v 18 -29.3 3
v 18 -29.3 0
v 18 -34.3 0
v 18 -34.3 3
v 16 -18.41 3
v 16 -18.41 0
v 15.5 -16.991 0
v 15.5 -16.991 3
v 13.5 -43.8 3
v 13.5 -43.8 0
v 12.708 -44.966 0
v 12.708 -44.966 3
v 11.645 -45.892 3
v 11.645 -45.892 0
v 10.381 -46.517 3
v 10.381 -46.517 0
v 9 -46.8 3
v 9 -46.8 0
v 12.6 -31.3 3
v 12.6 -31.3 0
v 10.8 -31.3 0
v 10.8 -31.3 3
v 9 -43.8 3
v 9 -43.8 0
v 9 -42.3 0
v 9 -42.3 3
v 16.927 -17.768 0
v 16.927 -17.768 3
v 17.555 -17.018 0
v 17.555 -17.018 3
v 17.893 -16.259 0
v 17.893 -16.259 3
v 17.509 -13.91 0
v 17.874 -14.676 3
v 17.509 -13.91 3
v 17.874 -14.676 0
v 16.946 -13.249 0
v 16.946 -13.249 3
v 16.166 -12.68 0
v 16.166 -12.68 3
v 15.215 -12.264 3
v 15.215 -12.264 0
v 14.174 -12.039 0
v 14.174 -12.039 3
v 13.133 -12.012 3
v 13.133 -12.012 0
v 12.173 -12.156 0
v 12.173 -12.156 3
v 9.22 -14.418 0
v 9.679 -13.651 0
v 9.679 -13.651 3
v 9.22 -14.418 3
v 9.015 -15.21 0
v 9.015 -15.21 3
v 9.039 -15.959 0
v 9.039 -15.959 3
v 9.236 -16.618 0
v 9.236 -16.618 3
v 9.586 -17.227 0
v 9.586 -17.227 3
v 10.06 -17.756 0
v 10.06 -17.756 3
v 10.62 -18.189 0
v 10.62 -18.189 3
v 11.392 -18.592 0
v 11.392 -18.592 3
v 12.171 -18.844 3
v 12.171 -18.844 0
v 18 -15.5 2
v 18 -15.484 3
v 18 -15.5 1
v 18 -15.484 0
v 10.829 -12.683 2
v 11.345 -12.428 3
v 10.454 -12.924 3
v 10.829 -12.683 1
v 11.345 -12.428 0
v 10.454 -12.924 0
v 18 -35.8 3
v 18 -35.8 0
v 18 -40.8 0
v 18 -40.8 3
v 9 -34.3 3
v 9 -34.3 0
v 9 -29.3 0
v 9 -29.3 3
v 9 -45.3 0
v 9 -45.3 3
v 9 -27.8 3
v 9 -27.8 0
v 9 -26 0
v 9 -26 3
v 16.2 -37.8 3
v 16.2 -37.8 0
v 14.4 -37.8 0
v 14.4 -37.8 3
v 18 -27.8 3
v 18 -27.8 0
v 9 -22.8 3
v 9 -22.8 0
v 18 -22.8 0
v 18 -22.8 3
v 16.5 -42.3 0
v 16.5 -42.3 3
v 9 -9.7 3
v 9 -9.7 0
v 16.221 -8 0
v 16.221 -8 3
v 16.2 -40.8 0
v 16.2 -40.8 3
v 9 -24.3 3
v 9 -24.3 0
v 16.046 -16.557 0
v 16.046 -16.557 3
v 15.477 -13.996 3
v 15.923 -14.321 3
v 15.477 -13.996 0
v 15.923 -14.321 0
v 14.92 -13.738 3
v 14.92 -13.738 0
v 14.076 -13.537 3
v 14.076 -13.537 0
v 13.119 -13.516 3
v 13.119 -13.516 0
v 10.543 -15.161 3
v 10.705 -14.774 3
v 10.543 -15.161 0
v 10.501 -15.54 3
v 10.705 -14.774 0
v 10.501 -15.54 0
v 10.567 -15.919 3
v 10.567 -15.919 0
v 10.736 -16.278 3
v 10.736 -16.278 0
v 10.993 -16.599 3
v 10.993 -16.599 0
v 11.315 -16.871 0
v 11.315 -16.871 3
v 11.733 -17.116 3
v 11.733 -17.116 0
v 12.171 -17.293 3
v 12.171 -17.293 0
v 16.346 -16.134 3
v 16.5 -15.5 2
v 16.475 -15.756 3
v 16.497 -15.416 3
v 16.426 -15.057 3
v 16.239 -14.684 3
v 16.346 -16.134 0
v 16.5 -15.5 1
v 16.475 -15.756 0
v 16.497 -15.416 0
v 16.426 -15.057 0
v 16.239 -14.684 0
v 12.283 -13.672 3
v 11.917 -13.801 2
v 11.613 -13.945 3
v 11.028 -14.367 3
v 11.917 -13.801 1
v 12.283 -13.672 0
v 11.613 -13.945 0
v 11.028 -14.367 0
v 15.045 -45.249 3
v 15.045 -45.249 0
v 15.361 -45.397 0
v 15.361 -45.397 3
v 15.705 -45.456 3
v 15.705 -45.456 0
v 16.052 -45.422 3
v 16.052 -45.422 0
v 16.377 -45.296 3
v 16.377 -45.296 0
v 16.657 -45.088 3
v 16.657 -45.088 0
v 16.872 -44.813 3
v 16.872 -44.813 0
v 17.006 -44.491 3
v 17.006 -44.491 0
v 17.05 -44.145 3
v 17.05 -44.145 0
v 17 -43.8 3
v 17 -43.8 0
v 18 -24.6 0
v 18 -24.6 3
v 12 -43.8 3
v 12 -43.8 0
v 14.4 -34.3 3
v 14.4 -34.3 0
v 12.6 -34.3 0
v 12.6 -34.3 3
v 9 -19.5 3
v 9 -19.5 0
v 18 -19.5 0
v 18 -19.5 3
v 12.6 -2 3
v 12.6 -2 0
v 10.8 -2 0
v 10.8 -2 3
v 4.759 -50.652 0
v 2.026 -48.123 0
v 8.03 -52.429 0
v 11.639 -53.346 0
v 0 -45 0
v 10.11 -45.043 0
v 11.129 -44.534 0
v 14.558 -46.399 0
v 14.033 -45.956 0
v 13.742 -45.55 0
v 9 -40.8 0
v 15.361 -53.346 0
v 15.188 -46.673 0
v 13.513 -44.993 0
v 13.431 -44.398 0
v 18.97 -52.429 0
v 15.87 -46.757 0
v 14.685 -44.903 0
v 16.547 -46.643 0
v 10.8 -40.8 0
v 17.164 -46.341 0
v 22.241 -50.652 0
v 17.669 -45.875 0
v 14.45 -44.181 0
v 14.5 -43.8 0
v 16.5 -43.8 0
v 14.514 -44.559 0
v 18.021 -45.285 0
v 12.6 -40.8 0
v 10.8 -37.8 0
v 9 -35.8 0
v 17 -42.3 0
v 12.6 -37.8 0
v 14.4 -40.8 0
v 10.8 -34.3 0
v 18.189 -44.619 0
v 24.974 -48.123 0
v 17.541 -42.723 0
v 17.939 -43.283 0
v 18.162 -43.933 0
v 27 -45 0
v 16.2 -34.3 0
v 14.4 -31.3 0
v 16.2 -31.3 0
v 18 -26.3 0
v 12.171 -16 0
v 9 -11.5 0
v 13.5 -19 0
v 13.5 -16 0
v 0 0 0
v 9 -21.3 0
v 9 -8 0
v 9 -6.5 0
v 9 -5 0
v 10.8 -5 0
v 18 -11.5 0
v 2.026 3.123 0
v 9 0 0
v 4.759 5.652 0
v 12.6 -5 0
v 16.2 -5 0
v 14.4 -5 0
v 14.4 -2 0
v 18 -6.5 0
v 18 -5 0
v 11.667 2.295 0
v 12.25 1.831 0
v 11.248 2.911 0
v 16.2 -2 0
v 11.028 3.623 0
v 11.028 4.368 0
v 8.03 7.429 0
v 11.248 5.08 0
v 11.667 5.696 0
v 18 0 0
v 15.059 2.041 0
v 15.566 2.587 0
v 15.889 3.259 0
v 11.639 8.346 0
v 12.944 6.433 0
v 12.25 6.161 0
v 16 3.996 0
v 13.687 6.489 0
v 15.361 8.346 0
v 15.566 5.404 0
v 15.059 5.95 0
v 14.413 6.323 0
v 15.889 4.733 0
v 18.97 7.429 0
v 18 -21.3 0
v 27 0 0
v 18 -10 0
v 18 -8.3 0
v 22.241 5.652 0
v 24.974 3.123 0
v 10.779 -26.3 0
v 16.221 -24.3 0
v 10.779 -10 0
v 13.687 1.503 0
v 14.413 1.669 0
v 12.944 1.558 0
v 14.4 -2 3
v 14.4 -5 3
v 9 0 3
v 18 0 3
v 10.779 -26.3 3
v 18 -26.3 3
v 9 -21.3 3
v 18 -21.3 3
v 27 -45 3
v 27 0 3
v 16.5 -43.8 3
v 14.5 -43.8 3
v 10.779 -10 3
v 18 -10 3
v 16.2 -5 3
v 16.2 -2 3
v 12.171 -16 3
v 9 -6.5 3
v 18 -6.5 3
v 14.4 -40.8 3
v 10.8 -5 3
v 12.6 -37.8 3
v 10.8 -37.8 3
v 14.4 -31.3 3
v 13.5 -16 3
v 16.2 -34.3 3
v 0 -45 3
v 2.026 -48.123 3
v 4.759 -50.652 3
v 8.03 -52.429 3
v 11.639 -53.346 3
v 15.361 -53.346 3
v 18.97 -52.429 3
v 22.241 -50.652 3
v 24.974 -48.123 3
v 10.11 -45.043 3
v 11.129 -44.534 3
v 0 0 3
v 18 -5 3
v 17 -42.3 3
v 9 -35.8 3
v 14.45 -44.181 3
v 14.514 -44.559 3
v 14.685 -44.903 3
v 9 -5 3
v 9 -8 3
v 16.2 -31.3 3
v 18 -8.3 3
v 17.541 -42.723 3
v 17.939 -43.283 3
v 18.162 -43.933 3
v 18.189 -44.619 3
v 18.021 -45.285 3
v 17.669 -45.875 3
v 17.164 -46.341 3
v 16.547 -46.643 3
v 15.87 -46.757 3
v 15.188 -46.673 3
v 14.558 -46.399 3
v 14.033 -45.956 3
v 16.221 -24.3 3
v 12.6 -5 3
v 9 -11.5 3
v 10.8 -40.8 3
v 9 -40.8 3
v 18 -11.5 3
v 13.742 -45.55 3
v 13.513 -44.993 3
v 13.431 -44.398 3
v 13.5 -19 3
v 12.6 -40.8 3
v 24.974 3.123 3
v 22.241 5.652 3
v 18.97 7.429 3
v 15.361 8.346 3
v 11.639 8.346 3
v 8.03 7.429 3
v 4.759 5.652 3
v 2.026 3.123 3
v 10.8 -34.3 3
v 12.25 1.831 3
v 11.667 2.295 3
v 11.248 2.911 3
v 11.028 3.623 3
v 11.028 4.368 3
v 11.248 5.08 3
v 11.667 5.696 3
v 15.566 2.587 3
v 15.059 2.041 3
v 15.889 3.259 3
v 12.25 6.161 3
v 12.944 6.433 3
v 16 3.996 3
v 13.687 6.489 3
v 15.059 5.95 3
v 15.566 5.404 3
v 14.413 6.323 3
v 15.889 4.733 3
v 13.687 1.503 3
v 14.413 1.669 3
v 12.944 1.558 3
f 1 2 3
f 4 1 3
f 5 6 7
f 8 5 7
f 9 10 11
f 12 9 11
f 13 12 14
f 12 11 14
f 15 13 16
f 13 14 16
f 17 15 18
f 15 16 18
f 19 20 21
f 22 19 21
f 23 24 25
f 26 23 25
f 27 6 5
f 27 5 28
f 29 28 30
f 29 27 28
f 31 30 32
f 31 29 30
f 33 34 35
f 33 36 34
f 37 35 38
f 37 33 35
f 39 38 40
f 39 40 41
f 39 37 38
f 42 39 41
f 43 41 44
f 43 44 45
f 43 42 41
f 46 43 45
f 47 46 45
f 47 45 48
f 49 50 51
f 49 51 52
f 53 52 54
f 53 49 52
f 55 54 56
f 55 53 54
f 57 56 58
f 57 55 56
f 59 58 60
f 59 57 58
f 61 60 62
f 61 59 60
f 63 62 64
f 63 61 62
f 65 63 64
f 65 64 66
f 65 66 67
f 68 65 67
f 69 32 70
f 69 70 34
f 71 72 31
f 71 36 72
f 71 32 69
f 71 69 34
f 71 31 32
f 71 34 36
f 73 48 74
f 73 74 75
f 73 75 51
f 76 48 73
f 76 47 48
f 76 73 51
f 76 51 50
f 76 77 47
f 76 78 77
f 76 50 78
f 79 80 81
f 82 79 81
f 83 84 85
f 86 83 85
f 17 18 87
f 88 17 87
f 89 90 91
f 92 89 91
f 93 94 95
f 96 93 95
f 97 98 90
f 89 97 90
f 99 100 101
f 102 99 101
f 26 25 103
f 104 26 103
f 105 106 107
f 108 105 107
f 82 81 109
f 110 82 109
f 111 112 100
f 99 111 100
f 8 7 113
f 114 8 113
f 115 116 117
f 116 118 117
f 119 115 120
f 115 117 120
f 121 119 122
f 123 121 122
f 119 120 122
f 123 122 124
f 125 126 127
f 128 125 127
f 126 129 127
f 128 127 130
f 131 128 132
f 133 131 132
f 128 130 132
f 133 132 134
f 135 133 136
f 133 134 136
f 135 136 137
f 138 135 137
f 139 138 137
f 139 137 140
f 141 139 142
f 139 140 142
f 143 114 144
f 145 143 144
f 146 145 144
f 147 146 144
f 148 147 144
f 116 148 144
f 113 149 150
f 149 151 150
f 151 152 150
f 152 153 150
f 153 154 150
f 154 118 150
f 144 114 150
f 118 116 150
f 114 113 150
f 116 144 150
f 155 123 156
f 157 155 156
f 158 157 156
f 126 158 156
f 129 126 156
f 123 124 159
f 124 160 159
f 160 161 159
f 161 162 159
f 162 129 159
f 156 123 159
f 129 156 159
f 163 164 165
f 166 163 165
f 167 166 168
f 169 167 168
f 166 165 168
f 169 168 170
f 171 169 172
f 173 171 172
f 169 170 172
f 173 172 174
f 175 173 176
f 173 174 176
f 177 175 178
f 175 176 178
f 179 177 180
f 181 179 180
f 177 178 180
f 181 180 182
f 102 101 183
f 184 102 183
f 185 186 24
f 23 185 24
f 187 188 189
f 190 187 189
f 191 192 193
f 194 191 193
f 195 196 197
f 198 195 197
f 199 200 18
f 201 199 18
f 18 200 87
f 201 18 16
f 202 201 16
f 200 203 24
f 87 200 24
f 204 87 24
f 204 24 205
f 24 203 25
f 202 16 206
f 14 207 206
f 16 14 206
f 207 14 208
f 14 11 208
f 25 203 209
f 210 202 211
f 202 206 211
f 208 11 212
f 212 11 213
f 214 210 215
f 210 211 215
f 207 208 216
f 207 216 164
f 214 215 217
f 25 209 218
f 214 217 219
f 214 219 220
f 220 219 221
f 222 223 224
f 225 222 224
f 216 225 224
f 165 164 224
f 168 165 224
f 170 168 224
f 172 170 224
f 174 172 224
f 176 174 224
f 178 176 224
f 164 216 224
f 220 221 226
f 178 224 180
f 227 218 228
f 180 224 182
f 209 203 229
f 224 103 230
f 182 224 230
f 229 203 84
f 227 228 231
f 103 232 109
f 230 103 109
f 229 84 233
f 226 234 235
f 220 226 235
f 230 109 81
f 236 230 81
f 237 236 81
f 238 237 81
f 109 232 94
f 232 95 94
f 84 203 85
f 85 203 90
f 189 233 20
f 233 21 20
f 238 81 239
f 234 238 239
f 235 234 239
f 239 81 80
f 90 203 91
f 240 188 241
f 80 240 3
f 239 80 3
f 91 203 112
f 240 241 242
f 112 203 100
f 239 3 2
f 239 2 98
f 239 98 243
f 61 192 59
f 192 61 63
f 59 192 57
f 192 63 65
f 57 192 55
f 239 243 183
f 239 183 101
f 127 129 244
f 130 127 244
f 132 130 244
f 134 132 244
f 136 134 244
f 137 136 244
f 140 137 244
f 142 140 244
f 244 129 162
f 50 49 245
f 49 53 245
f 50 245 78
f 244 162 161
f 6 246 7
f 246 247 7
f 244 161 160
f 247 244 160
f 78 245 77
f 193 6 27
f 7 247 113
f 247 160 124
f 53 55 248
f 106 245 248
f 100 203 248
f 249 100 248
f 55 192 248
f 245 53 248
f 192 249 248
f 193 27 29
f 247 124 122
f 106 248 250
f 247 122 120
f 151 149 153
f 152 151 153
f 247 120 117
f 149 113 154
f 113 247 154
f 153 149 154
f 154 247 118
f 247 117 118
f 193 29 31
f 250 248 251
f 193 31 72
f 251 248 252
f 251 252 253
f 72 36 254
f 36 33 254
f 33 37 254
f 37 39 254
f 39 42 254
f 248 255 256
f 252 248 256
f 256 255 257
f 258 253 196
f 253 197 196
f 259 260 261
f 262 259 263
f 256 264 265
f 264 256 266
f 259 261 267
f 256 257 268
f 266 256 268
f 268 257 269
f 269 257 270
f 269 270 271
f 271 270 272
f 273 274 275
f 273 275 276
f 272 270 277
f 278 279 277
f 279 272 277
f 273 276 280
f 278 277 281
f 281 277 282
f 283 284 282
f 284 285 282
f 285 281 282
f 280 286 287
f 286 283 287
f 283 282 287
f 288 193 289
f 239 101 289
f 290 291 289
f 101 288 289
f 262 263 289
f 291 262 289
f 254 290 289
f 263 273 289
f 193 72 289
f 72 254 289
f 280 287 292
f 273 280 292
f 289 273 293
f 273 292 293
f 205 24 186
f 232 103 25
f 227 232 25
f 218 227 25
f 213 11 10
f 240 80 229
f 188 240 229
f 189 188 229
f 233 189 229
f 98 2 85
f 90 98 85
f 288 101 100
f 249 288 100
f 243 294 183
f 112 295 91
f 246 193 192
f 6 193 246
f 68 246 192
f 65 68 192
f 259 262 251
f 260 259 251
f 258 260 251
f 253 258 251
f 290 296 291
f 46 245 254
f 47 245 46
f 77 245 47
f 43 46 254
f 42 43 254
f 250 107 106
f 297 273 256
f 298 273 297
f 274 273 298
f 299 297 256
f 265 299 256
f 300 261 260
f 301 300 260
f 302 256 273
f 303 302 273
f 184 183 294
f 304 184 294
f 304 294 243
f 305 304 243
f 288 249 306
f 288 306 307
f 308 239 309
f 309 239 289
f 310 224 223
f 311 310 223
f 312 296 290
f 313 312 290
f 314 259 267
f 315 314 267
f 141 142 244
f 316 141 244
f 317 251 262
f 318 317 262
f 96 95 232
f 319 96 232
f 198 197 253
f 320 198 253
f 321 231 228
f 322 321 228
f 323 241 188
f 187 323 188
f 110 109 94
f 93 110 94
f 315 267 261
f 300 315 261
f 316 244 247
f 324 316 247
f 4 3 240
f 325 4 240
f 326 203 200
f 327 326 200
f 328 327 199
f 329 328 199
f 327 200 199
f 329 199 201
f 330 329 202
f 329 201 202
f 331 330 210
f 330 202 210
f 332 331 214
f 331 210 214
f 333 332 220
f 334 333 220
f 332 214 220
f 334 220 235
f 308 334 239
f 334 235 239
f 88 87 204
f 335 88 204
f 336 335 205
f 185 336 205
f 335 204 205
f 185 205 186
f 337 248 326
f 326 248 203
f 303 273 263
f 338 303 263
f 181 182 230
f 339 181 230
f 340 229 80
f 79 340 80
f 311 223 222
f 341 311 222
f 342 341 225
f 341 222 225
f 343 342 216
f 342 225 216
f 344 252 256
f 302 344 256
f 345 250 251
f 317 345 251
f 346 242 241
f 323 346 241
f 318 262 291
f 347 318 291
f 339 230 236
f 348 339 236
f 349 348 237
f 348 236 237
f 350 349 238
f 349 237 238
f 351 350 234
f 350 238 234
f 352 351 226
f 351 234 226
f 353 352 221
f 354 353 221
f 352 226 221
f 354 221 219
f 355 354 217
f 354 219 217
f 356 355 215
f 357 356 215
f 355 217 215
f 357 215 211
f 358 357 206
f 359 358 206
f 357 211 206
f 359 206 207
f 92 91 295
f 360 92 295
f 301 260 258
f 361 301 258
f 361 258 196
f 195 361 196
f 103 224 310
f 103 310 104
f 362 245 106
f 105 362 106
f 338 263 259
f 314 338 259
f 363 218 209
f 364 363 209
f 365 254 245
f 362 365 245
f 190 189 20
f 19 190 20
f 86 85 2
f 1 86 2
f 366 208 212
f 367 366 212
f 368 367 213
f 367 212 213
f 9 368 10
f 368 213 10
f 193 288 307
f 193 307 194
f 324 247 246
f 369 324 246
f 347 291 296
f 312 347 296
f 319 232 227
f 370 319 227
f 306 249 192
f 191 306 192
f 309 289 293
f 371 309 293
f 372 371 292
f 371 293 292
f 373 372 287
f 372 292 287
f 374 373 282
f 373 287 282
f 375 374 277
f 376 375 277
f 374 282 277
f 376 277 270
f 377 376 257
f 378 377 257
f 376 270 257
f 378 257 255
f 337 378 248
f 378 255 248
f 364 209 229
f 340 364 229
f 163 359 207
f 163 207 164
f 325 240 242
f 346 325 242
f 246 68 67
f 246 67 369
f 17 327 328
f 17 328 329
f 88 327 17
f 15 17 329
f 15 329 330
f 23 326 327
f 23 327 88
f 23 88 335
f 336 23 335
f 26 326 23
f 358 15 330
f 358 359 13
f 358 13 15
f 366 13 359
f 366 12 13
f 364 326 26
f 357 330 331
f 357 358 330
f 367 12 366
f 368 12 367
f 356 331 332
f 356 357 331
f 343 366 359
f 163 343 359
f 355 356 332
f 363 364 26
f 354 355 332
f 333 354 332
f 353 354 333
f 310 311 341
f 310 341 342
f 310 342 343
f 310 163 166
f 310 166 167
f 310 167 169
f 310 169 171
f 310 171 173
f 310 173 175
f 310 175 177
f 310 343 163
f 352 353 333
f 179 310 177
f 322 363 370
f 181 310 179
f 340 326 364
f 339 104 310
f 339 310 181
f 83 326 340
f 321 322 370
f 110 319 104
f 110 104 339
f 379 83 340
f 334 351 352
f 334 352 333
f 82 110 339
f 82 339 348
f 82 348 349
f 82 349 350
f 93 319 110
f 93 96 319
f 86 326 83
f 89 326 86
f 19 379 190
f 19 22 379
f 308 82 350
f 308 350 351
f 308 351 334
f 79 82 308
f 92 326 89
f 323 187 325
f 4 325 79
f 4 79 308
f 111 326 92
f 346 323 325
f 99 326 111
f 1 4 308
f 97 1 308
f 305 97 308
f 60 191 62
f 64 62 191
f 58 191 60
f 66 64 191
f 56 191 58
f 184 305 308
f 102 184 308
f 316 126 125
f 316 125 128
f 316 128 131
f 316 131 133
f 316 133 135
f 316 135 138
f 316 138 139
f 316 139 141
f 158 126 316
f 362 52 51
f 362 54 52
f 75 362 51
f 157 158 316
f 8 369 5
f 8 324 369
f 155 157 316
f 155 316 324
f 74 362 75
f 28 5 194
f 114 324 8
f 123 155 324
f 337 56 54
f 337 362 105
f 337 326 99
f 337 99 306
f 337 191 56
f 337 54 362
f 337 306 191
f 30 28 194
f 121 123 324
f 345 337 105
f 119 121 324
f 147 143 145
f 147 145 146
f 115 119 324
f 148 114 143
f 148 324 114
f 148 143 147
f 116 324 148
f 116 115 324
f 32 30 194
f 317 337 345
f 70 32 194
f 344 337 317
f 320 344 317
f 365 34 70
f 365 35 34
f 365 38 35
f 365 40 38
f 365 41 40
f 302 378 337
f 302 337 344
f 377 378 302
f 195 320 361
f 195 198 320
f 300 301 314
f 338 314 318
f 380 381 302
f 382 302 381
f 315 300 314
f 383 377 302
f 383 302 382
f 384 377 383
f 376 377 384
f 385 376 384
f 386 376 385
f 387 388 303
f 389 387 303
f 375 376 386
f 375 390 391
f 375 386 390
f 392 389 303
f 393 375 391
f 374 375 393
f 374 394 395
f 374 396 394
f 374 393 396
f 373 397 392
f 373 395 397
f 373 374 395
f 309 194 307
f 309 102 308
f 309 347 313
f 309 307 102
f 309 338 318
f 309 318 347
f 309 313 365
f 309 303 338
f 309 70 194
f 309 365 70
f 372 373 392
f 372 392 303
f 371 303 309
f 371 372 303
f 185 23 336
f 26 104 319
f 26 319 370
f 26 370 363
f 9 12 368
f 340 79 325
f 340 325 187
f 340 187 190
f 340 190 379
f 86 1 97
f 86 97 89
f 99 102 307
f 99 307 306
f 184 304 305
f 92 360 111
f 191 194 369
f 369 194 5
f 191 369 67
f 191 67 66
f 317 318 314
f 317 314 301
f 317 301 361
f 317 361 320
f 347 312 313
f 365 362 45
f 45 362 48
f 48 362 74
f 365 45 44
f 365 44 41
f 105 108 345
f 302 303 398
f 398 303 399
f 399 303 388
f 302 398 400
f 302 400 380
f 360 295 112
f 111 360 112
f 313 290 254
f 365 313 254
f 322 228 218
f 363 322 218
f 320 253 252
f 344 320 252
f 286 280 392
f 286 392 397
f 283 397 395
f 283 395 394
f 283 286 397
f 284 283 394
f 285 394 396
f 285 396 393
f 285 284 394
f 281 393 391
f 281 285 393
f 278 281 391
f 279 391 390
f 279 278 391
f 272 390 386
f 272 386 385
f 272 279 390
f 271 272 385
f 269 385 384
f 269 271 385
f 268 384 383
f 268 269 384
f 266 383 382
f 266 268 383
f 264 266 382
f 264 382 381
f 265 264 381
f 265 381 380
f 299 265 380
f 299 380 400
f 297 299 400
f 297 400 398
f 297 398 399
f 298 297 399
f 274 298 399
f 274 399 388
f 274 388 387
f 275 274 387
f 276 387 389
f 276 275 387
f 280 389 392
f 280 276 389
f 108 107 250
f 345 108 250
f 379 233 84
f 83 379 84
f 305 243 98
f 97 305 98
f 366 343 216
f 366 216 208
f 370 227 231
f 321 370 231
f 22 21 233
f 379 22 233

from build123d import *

# Parameters (mm, degrees)
F0_W     = 9
F0_H     = 1.8
F0_R     = 2.5
F0_W_2   = 0.5
F0_H_2   = 1.5
F1_DEPTH = 3


with BuildPart() as f1:
    # F0 (on Top) → F1 (new body)
    with BuildSketch(Plane.XY):
        with BuildLine():
            ThreePointArc((27, 0), (13.5, 8.4616515847), (0, 0))
            Line((0, 0), (0, -45))
            ThreePointArc((0, -45), (13.5, -53.4616515847), (27, -45))
            Line((27, -45), (27, 0))
        make_face()
        with BuildLine():
            Line((9, -43.8), (9, -42.3))
            Line((9, -42.3), (16.5, -42.3))
            Line((16.5, -42.3), (17, -42.3))
            ThreePointArc((17, -42.3), (17.66899179, -45.8750933579), (14.0327498007, -45.9562520189))
            ThreePointArc((14.0327498007, -45.9562520189), (13.8765268876, -45.76063274), (13.7416614246, -45.5497208918))
            ThreePointArc((13.7416614246, -45.5497208918), (13.452948616, -44.6980473592), (13.5, -43.8))
            ThreePointArc((13.5, -43.8), (11.6446119997, -45.8919179995), (9, -46.8))
            Line((9, -46.8), (9, -45.3))
            ThreePointArc((9, -45.3), (10.6342615319, -44.8185230639), (12, -43.8))
            Line((12, -43.8), (9, -43.8))
        make_face(mode=Mode.SUBTRACT)
        Polygon((9, -35.8), (18, -35.8), (18, -40.8), (16.2, -40.8), (16.2, -37.8), (14.4, -37.8), (14.4, -40.8), (12.6, -40.8), (12.6, -37.8), (10.8, -37.8), (10.8, -40.8), (9, -40.8), align=None, mode=Mode.SUBTRACT)
        Polygon((9, -34.3), (9, -29.3), (18, -29.3), (18, -34.3), (16.2, -34.3), (16.2, -31.3), (14.4, -31.3), (14.4, -34.3), (12.6, -34.3), (12.6, -31.3), (10.8, -31.3), (10.8, -34.3), align=None, mode=Mode.SUBTRACT)
        Polygon((9, -24.3), (9, -22.8), (18, -22.8), (18, -24.6), (10.779, -26.3), (18, -26.3), (18, -27.8), (9, -27.8), (9, -26), (16.2212999509, -24.3), align=None, mode=Mode.SUBTRACT)
        with Locations((13.5, -20.4)):
            Rectangle(F0_W, F0_H, mode=Mode.SUBTRACT)
        with BuildLine():
            add(Edge.make_bspline(
                [(18, -15.5), (18, -8.5693256297), (10.8288359741, -12.6833185304), (3.6576719482, -16.7973114311), (12.1711632237, -18.8439192062)],
                knots=[0, 0, 0, 2.2063112748, 2.2063112748, 4.4126225496, 4.4126225496, 4.4126225496], degree=2, weights=[1, 0.4507815404, 1, 0.4507815404, 1]))
            add(Edge.make_bspline(
                [(16, -18.4101779675), (18, -17.3708286934), (18, -15.5)],
                knots=[5.3014199506, 5.3014199506, 5.3014199506, 6.2831853072, 6.2831853072, 6.2831853072], degree=2, weights=[1, 0.8819171037, 1]))
            add(Edge.make_bspline(
                [(13.5, -19), (14.8650167038, -19), (16, -18.4101779675)],
                knots=[4.7123889804, 4.7123889804, 4.7123889804, 5.3014199506, 5.3014199506, 5.3014199506], degree=2, weights=[1, 0.9569428978, 1]))
            add(Edge.make_bspline(
                [(12.1711632237, -18.8439192062), (12.8204290441, -19), (13.5, -19)],
                knots=[4.4126225496, 4.4126225496, 4.4126225496, 4.7123889804, 4.7123889804, 4.7123889804], degree=2, weights=[1, 0.9887885233, 1]))
        make_face(mode=Mode.SUBTRACT)
        Polygon((9, -8), (9, -6.5), (18, -6.5), (18, -8.3), (10.779, -10), (18, -10), (18, -11.5), (9, -11.5), (9, -9.7), (16.2212999509, -8), align=None, mode=Mode.SUBTRACT)
        Polygon((9, -5), (9, 0), (18, 0), (18, -5), (16.2, -5), (16.2, -2), (14.4, -2), (14.4, -5), (12.6, -5), (12.6, -2), (10.8, -2), (10.8, -5), align=None, mode=Mode.SUBTRACT)
        with Locations((13.5, 3.9957081899)):
            Circle(F0_R, mode=Mode.SUBTRACT)
        with BuildLine():
            add(Edge.make_bspline(
                [(16.5, -15.5), (16.5, -11.9027200979), (11.9167297023, -13.8012089051), (7.3334594046, -15.6996977122), (12.1711632237, -17.2930969884)],
                knots=[0, 0, 0, 2.1267537417, 2.1267537417, 4.2535074833, 4.2535074833, 4.2535074833], degree=2, weights=[1, 0.4859234683, 1, 0.4859234683, 1]))
            Line((12.1711632237, -17.2930969884), (12.1711632237, -16))
            Line((12.1711632237, -16), (13.5, -16))
            Line((13.5, -16), (13.5, -17.5))
            add(Edge.make_bspline(
                [(13.5, -17.5), (14.6458980338, -17.5), (15.5, -16.990711985)],
                knots=[4.7123889804, 4.7123889804, 4.7123889804, 5.4421166366, 5.4421166366, 5.4421166366], degree=2, weights=[1, 0.934172359, 1]))
            add(Edge.make_bspline(
                [(15.5, -16.990711985), (16.5, -16.394427191), (16.5, -15.5)],
                knots=[5.4421166366, 5.4421166366, 5.4421166366, 6.2831853072, 6.2831853072, 6.2831853072], degree=2, weights=[1, 0.9128709292, 1]))
        make_face()
        with BuildLine():
            add(Edge.make_bspline(
                [(13.5, -19), (14.8650167038, -19), (16, -18.4101779675)],
                knots=[4.7123889804, 4.7123889804, 4.7123889804, 5.3014199506, 5.3014199506, 5.3014199506], degree=2, weights=[1, 0.9569428978, 1]))
            Line((16, -18.4101779675), (15.5, -16.990711985))
            add(Edge.make_bspline(
                [(13.5, -17.5), (14.6458980338, -17.5), (15.5, -16.990711985)],
                knots=[4.7123889804, 4.7123889804, 4.7123889804, 5.4421166366, 5.4421166366, 5.4421166366], degree=2, weights=[1, 0.934172359, 1]))
            Line((13.5, -17.5), (13.5, -19))
        make_face()
        with BuildLine():
            Line((17, -43.8), (16.5, -43.8))
            Line((16.5, -43.8), (14.5, -43.8))
            ThreePointArc((14.5, -43.8), (14.467921138, -44.3721848606), (14.6849938716, -44.9025658523))
            ThreePointArc((14.6849938716, -44.9025658523), (14.8482368669, -45.09345983), (15.0451432596, -45.2493978266))
            ThreePointArc((15.0451432596, -45.2493978266), (16.5242633972, -45.201349254), (17, -43.8))
        make_face()
        with Locations((16.75, -43.05)):
            Rectangle(F0_W_2, F0_H_2)
        with BuildLine():
            ThreePointArc((13.7416614246, -45.5497208918), (13.8765268876, -45.76063274), (14.0327498007, -45.9562520189))
            Line((14.0327498007, -45.9562520189), (15.0451432596, -45.2493978266))
            ThreePointArc((15.0451432596, -45.2493978266), (14.8482368669, -45.09345983), (14.6849938716, -44.9025658523))
            Line((14.6849938716, -44.9025658523), (13.7416614246, -45.5497208918))
        make_face()
    extrude(amount=F1_DEPTH)


solid = f1.part
